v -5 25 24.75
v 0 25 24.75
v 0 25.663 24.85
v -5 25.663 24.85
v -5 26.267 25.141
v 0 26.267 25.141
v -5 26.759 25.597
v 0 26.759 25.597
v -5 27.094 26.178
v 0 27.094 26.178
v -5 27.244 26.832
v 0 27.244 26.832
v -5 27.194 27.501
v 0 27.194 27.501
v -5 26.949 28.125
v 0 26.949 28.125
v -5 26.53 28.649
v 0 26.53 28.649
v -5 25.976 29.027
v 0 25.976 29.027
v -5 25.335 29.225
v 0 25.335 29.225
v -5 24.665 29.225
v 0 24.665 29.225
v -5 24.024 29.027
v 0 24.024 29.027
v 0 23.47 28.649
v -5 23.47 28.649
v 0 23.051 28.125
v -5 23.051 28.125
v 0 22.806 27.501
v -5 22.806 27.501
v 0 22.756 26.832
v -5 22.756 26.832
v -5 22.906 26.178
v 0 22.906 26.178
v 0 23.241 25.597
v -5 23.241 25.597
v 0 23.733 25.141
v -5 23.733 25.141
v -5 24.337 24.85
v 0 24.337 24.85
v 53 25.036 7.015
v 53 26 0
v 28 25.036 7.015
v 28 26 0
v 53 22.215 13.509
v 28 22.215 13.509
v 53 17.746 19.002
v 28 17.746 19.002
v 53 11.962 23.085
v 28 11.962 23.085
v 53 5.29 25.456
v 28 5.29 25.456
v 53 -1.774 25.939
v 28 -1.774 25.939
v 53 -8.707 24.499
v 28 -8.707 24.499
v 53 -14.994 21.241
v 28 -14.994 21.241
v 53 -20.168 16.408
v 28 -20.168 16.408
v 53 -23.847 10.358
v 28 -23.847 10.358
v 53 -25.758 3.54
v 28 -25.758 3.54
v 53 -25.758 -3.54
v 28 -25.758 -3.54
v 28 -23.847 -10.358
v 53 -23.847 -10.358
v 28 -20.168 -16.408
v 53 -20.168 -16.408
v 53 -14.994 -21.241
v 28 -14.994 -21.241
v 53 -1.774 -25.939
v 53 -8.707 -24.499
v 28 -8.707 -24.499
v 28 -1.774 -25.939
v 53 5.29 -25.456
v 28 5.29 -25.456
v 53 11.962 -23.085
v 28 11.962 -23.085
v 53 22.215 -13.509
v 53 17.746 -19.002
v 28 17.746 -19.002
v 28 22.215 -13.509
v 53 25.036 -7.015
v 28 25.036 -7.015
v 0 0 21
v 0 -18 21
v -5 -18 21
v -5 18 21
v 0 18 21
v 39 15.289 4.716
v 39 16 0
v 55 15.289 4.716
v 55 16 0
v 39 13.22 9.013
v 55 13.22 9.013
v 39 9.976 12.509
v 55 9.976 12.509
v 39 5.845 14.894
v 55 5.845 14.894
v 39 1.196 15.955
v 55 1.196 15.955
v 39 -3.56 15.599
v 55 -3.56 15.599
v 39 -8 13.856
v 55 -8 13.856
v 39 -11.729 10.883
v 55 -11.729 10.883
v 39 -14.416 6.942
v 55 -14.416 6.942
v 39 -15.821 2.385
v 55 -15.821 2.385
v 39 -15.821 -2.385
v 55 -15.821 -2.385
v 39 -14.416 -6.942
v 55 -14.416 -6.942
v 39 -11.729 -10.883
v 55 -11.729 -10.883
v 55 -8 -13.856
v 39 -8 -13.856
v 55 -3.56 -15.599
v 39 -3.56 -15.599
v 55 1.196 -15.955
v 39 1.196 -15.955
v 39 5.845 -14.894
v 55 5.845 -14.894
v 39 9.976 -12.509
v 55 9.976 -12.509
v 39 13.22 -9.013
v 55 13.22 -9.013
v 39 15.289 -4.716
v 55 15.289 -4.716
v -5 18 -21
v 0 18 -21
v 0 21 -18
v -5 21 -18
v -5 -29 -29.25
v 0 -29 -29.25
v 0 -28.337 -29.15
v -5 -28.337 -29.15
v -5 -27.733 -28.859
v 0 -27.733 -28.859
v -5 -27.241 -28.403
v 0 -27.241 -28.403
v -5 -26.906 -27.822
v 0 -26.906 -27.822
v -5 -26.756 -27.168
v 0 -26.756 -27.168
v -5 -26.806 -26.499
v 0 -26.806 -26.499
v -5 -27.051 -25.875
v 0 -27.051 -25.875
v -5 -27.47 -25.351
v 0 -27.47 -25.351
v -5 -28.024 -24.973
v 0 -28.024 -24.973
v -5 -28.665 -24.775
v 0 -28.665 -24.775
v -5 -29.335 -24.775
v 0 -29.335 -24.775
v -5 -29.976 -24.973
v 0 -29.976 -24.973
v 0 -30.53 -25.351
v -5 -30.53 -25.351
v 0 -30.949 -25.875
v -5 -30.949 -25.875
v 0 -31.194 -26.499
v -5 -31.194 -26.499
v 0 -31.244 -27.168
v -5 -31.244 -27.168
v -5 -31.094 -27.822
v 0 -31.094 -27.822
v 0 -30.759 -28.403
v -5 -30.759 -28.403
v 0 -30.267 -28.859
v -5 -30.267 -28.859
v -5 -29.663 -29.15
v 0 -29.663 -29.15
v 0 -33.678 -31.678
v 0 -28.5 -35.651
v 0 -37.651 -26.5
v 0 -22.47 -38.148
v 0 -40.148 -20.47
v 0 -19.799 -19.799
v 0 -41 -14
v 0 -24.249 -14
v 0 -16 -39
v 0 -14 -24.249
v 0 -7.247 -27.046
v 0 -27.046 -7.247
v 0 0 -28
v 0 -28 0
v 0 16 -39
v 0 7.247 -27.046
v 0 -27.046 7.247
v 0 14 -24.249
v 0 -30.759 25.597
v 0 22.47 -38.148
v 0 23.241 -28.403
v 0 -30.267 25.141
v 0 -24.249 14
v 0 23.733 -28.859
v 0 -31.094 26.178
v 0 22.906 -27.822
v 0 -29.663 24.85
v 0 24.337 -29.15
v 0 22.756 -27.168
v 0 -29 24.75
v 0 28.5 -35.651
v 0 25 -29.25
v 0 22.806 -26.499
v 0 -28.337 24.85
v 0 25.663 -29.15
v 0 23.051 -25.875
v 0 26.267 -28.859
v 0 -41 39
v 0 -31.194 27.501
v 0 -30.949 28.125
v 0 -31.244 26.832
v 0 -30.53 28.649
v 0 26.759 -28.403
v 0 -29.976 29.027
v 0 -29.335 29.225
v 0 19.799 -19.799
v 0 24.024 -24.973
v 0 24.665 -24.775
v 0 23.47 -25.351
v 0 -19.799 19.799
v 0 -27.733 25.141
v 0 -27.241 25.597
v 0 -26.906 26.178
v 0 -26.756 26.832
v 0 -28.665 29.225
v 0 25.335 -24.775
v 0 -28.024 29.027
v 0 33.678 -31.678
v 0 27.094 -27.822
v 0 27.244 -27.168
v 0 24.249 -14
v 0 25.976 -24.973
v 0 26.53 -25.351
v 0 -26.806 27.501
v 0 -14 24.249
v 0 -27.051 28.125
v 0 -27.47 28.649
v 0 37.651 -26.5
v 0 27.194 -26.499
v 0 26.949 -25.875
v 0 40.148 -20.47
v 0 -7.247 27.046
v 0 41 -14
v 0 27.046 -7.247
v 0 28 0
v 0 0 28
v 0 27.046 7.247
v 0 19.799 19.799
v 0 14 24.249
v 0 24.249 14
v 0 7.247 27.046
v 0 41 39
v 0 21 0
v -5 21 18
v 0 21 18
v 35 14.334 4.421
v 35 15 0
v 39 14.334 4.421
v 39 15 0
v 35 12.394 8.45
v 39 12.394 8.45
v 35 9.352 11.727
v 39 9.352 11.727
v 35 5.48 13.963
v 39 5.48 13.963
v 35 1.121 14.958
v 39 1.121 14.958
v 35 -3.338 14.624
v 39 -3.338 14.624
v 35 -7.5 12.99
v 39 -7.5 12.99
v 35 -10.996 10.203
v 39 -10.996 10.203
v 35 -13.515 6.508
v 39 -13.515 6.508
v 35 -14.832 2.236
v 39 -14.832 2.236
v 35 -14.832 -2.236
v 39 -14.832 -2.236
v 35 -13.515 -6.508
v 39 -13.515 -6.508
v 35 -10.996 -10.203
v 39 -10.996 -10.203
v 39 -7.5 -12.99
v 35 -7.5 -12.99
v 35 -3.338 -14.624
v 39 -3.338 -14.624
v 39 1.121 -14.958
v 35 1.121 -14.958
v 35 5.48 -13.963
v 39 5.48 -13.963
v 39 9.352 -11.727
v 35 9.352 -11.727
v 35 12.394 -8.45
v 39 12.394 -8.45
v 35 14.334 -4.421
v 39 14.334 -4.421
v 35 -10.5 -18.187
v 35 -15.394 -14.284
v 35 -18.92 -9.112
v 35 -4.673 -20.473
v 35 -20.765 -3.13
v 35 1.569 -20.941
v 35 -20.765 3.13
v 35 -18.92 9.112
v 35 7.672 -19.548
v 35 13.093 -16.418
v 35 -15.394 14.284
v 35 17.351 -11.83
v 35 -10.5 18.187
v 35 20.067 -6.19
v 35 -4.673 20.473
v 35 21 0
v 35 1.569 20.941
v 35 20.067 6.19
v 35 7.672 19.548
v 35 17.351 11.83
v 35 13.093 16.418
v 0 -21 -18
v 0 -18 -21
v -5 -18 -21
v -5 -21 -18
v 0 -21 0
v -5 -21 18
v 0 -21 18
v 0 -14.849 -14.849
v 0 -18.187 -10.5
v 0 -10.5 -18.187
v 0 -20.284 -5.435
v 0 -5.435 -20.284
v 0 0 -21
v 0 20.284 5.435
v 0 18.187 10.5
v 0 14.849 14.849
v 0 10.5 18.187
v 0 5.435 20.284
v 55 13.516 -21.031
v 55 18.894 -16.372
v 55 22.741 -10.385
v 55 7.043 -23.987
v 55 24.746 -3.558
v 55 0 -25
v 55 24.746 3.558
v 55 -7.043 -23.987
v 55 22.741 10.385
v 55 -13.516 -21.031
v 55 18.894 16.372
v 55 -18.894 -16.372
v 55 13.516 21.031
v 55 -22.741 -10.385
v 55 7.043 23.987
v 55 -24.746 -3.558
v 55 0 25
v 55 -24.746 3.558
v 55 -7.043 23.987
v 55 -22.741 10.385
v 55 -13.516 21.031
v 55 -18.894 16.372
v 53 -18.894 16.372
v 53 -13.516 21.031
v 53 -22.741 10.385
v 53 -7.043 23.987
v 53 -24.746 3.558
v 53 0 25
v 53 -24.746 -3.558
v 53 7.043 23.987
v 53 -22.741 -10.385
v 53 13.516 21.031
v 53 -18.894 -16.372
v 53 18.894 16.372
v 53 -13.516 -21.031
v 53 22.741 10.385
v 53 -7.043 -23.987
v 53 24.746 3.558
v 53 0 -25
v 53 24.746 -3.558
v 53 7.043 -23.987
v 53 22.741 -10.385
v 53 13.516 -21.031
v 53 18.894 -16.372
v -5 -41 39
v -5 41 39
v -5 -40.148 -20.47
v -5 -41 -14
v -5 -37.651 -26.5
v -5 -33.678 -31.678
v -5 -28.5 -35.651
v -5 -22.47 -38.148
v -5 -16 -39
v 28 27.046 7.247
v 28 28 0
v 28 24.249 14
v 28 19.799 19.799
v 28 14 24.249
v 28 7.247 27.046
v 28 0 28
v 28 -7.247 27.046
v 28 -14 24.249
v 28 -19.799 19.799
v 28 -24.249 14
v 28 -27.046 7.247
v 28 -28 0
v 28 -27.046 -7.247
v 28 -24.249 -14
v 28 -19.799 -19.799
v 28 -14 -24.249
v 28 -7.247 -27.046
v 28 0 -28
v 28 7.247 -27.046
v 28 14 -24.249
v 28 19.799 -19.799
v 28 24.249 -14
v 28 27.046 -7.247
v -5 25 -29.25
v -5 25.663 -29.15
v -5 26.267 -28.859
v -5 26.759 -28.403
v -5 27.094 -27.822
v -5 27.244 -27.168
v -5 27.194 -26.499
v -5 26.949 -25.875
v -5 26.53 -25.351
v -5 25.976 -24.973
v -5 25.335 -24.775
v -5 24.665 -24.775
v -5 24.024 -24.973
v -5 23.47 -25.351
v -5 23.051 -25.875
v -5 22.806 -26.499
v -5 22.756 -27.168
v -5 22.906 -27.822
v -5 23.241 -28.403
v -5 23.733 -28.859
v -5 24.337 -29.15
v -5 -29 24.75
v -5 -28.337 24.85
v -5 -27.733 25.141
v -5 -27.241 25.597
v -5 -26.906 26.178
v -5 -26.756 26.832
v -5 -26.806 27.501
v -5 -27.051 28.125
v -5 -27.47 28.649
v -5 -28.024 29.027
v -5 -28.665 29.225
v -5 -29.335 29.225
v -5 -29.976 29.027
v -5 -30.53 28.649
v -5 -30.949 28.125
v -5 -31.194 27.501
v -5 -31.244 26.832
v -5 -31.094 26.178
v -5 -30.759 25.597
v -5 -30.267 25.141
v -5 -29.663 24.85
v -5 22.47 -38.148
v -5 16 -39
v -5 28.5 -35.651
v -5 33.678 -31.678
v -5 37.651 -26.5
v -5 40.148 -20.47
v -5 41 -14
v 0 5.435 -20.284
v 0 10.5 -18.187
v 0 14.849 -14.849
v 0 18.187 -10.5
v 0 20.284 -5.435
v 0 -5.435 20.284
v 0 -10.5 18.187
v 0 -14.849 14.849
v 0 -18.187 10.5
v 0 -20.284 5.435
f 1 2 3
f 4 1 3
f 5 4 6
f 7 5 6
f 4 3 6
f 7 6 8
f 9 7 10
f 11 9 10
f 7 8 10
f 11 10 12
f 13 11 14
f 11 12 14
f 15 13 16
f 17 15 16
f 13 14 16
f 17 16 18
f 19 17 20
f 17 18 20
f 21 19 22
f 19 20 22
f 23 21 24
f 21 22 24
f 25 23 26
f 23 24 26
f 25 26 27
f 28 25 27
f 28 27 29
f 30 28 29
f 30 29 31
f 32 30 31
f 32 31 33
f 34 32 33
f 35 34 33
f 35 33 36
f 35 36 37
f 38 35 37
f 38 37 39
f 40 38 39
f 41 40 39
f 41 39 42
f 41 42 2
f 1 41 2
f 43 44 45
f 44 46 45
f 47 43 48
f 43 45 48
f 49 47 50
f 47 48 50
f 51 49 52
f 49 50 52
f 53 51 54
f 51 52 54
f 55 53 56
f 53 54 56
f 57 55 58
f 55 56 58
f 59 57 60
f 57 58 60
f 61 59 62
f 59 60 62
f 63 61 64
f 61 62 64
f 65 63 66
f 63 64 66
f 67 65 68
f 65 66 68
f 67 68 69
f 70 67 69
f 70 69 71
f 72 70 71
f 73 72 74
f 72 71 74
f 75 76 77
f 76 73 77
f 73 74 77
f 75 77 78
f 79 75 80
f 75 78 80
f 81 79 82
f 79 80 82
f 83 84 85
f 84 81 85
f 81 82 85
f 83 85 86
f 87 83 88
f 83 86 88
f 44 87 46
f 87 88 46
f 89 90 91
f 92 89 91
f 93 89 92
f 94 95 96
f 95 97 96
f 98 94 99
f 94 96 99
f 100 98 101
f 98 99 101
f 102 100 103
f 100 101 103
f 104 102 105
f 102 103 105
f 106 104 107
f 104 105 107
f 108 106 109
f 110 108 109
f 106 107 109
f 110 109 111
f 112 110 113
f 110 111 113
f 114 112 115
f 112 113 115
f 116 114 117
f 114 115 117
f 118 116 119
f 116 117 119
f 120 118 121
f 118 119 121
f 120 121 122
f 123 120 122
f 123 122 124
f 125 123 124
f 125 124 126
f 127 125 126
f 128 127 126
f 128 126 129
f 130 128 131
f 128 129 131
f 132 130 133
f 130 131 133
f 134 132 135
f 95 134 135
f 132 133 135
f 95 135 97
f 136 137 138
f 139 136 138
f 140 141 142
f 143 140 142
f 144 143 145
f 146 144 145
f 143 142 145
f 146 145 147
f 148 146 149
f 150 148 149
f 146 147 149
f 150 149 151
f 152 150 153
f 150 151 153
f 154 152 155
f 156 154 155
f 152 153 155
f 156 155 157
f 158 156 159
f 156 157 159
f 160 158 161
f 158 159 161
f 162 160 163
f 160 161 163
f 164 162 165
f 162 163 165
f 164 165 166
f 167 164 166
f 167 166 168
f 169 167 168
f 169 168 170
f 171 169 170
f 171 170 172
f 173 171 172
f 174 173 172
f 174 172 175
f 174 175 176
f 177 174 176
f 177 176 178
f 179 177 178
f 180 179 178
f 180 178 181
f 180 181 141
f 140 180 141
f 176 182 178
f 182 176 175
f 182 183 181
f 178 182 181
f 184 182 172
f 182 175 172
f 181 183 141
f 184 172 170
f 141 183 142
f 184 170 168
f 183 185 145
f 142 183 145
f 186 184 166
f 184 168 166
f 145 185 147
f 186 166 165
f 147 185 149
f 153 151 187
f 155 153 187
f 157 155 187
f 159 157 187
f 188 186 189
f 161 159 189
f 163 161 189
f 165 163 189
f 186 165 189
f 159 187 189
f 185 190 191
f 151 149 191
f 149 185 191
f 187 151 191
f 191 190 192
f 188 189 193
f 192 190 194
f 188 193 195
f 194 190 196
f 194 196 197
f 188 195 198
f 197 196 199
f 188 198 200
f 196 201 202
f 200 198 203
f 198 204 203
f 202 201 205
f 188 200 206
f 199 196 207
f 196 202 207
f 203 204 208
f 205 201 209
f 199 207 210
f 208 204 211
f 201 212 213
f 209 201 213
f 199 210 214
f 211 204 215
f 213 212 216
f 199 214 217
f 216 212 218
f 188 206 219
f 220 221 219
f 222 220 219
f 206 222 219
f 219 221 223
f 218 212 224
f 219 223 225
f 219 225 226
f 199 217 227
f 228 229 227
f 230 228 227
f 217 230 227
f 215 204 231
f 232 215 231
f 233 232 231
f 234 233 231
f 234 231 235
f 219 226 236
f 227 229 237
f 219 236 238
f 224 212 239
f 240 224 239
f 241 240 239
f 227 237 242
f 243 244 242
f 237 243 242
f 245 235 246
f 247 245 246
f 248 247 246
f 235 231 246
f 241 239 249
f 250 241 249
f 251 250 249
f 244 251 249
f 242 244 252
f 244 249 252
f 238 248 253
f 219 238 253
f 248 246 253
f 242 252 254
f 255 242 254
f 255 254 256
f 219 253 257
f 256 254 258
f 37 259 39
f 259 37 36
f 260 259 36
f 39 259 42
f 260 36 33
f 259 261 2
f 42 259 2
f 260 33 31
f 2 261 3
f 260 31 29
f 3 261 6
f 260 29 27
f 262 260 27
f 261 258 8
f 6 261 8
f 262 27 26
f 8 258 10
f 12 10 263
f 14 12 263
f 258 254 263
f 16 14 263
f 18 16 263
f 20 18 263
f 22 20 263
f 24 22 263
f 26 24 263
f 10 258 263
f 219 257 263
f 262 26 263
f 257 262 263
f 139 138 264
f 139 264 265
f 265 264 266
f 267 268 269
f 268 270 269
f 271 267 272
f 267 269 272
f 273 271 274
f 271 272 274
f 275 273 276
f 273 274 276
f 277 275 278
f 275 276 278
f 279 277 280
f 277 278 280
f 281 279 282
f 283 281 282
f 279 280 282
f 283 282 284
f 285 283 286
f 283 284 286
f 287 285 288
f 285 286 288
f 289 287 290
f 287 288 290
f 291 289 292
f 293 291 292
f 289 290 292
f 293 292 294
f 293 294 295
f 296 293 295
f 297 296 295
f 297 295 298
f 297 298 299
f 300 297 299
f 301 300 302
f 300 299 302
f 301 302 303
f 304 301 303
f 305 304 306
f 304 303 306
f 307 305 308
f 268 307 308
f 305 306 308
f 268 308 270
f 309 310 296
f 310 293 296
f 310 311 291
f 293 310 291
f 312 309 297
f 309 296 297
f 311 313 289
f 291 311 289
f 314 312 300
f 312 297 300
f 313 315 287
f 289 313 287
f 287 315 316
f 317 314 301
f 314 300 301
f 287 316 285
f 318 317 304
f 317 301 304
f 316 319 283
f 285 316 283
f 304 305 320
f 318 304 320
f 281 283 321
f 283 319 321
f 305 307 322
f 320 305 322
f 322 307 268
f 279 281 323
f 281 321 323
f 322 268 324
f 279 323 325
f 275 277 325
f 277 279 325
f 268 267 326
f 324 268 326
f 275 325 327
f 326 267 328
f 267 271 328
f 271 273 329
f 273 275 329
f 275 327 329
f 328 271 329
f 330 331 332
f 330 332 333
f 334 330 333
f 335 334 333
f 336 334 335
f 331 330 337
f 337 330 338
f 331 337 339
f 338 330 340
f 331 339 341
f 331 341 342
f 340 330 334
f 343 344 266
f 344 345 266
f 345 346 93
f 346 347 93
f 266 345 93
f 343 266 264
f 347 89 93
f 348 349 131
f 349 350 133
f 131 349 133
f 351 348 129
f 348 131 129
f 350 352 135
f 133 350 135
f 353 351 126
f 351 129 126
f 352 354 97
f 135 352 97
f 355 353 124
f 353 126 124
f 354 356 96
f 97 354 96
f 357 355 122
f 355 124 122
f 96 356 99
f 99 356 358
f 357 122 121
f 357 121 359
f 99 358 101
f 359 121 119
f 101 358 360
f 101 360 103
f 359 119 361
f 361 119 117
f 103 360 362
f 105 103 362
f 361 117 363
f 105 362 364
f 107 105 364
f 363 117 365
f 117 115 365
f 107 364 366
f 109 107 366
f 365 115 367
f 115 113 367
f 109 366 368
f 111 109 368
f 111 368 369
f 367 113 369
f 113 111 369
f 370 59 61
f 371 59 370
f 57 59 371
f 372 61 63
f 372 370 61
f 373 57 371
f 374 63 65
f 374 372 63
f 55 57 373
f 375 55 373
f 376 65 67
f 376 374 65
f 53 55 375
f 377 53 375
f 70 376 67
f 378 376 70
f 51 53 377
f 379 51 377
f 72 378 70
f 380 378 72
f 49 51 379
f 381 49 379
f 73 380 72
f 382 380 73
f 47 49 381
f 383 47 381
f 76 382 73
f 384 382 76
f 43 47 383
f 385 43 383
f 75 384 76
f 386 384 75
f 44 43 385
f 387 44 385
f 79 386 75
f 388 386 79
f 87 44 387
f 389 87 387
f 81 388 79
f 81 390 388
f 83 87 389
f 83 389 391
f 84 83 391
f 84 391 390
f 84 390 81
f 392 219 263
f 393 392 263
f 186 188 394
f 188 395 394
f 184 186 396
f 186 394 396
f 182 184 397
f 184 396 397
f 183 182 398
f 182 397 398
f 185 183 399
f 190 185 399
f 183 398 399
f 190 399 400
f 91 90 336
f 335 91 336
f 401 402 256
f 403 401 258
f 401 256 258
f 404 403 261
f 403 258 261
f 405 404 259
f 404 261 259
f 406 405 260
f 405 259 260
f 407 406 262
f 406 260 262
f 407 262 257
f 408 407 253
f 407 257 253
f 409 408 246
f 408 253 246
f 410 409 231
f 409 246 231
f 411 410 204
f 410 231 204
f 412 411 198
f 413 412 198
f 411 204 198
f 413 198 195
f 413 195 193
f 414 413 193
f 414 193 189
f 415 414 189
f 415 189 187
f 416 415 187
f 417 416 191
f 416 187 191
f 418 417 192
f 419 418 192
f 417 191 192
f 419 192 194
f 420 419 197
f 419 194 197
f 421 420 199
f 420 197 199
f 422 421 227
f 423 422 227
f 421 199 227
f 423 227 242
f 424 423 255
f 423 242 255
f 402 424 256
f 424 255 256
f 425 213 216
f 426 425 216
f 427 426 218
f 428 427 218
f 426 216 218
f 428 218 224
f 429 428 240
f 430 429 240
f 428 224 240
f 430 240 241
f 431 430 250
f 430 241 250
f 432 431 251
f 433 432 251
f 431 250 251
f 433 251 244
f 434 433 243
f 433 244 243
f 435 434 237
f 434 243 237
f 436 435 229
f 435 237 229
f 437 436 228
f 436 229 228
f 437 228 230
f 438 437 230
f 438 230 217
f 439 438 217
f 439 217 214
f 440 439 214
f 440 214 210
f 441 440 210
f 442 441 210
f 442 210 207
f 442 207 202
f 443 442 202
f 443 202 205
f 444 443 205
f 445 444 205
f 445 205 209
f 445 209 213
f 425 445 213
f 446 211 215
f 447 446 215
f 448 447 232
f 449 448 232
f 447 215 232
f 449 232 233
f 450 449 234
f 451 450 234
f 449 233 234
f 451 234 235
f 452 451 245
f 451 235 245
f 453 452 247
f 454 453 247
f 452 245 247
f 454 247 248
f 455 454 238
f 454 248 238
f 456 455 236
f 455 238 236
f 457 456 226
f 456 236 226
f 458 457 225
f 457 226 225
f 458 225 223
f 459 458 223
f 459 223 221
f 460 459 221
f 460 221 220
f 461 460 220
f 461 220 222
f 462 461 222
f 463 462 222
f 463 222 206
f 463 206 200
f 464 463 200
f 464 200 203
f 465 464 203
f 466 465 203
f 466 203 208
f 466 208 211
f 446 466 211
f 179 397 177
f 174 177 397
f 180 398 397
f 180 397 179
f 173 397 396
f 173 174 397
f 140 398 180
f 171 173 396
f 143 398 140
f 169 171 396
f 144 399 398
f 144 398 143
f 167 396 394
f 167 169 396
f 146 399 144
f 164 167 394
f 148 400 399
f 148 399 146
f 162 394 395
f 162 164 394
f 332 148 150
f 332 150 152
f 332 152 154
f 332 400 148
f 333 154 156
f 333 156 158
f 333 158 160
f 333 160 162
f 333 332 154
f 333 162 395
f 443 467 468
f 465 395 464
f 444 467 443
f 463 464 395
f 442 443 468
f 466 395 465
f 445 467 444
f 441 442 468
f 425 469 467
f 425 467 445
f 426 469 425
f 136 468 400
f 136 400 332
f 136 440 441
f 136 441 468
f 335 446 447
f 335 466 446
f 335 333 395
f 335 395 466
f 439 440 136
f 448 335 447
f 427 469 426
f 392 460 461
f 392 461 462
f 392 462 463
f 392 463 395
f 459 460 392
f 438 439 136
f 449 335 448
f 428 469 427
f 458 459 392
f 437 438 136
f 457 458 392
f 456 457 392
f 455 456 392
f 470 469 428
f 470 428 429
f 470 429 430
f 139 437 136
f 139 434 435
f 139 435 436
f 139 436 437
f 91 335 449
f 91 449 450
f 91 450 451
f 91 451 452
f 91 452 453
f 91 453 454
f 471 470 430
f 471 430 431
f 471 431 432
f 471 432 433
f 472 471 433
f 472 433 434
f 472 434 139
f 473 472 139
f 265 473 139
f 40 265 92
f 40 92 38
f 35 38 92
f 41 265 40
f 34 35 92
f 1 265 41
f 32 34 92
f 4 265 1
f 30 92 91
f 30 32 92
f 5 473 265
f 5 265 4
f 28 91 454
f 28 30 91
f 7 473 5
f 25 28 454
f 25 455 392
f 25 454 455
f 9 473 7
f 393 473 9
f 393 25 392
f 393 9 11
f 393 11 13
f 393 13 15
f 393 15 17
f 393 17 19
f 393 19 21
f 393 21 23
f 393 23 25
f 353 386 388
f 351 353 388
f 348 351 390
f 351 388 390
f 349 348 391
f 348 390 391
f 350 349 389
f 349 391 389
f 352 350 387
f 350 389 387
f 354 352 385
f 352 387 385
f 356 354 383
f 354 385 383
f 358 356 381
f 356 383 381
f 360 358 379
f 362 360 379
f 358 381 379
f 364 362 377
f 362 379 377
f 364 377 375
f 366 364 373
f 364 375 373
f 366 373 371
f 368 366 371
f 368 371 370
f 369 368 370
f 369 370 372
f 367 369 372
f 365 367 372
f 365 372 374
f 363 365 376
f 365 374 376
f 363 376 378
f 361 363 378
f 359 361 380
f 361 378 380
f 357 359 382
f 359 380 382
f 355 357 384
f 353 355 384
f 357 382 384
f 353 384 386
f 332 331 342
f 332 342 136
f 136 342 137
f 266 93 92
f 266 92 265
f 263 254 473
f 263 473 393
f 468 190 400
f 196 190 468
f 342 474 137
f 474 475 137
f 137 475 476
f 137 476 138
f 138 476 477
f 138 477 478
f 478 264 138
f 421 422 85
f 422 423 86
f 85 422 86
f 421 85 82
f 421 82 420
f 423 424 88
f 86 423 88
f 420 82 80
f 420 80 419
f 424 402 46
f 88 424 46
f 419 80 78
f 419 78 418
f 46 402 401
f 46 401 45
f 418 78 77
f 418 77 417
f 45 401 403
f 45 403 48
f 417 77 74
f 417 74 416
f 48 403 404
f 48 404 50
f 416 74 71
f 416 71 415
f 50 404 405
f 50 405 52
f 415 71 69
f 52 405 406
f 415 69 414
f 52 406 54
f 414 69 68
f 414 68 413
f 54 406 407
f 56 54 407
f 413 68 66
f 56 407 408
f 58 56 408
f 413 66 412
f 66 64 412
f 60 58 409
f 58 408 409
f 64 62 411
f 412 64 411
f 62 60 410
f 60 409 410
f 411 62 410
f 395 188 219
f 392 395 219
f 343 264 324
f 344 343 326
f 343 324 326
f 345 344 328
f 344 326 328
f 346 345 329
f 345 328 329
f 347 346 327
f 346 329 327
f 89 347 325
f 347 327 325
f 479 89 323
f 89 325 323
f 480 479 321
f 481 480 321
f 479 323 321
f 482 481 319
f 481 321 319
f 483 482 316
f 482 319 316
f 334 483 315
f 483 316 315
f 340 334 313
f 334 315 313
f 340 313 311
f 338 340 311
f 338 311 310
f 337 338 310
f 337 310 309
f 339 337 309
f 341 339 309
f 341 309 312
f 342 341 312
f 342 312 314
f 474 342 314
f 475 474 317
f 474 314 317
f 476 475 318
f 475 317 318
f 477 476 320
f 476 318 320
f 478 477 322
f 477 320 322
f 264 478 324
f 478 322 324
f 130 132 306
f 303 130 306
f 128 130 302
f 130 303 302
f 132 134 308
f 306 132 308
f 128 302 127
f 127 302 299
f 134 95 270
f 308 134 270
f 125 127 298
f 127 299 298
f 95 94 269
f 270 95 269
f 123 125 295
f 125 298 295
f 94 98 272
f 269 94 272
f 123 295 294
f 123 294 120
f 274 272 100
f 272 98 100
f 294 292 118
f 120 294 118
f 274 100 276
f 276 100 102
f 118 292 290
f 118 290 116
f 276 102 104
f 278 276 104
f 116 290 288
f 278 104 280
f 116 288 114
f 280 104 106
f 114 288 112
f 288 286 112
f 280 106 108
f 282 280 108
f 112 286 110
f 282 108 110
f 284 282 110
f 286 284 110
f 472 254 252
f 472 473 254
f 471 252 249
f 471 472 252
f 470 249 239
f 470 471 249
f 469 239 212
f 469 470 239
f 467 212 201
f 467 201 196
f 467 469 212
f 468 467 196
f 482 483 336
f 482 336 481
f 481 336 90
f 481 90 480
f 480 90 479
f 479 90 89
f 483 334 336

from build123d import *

# Parameters (mm, degrees)
SKETCH3_R                = 27.5
SKETCH3_R_2              = 25
CUT_EXTRUDE1_DEPTH       = 2
SKETCH4_W                = 78
SKETCH4_H                = 82
SKETCH4_W_2              = 42
SKETCH4_H_2              = 42
BOSS_EXTRUDE1_DEPTH      = 5
M4_CLEARANCE_HOLE1_D     = 4.5
M4_CLEARANCE_HOLE1_DEPTH = 5
BOSS_EXTRUDE4_DEPTH      = 5
FILLET1_R                = 25


with BuildPart() as part:
    # Sketch2 → Revolve1 (revolve)
    with BuildSketch(Plane.XY):
        Polygon((0, 21), (35, 21), (35, 15), (39, 15), (39, 16), (55, 16), (55, 26), (28, 26), (28, 28), (0, 28), align=None)
    revolve(axis=Axis((-64.103352454, 0, 0), (1, 0, 0)))

    # Sketch3 → Cut-Extrude1 (cut)
    with BuildSketch(Plane(origin=(53, 0, 0), x_dir=(0, 0, -1), z_dir=(1, 0, 0))):
        Circle(SKETCH3_R)
        Circle(SKETCH3_R_2, mode=Mode.SUBTRACT)
    extrude(amount=CUT_EXTRUDE1_DEPTH, mode=Mode.SUBTRACT)

    # Sketch4 → Boss-Extrude1 (add)
    with BuildSketch(Plane.ZY):
        Rectangle(SKETCH4_W, SKETCH4_H)
        Rectangle(SKETCH4_W_2, SKETCH4_H_2, mode=Mode.SUBTRACT)
    extrude(amount=BOSS_EXTRUDE1_DEPTH)

    # M4 Clearance Hole1
    with Locations(Plane.ZY.offset(5)):
        with Locations((-27, 25), (27, 25), (27, -29), (-27, -29)):
            Hole(M4_CLEARANCE_HOLE1_D / 2, depth=M4_CLEARANCE_HOLE1_DEPTH)

    # Sketch11 → Boss-Extrude4 (add)
    with BuildSketch(Plane.ZY):
        Polygon((-21, 18), (-18, 21), (-21, 21), align=None)
        Polygon((21, 21), (21, 18), (18, 21), align=None)
        Polygon((21, -21), (21, -18), (18, -21), align=None)
        Polygon((-21, -21), (-21, -18), (-18, -21), align=None)
    extrude(amount=BOSS_EXTRUDE4_DEPTH)

    # Fillet1
    fillet1_edges = [part.edges().sort_by_distance(p)[0] for p in [
        (-2.5, 41, -39),
        (-2.5, -41, -39),
    ]]
    fillet(fillet1_edges, radius=FILLET1_R)


solid = part.part
